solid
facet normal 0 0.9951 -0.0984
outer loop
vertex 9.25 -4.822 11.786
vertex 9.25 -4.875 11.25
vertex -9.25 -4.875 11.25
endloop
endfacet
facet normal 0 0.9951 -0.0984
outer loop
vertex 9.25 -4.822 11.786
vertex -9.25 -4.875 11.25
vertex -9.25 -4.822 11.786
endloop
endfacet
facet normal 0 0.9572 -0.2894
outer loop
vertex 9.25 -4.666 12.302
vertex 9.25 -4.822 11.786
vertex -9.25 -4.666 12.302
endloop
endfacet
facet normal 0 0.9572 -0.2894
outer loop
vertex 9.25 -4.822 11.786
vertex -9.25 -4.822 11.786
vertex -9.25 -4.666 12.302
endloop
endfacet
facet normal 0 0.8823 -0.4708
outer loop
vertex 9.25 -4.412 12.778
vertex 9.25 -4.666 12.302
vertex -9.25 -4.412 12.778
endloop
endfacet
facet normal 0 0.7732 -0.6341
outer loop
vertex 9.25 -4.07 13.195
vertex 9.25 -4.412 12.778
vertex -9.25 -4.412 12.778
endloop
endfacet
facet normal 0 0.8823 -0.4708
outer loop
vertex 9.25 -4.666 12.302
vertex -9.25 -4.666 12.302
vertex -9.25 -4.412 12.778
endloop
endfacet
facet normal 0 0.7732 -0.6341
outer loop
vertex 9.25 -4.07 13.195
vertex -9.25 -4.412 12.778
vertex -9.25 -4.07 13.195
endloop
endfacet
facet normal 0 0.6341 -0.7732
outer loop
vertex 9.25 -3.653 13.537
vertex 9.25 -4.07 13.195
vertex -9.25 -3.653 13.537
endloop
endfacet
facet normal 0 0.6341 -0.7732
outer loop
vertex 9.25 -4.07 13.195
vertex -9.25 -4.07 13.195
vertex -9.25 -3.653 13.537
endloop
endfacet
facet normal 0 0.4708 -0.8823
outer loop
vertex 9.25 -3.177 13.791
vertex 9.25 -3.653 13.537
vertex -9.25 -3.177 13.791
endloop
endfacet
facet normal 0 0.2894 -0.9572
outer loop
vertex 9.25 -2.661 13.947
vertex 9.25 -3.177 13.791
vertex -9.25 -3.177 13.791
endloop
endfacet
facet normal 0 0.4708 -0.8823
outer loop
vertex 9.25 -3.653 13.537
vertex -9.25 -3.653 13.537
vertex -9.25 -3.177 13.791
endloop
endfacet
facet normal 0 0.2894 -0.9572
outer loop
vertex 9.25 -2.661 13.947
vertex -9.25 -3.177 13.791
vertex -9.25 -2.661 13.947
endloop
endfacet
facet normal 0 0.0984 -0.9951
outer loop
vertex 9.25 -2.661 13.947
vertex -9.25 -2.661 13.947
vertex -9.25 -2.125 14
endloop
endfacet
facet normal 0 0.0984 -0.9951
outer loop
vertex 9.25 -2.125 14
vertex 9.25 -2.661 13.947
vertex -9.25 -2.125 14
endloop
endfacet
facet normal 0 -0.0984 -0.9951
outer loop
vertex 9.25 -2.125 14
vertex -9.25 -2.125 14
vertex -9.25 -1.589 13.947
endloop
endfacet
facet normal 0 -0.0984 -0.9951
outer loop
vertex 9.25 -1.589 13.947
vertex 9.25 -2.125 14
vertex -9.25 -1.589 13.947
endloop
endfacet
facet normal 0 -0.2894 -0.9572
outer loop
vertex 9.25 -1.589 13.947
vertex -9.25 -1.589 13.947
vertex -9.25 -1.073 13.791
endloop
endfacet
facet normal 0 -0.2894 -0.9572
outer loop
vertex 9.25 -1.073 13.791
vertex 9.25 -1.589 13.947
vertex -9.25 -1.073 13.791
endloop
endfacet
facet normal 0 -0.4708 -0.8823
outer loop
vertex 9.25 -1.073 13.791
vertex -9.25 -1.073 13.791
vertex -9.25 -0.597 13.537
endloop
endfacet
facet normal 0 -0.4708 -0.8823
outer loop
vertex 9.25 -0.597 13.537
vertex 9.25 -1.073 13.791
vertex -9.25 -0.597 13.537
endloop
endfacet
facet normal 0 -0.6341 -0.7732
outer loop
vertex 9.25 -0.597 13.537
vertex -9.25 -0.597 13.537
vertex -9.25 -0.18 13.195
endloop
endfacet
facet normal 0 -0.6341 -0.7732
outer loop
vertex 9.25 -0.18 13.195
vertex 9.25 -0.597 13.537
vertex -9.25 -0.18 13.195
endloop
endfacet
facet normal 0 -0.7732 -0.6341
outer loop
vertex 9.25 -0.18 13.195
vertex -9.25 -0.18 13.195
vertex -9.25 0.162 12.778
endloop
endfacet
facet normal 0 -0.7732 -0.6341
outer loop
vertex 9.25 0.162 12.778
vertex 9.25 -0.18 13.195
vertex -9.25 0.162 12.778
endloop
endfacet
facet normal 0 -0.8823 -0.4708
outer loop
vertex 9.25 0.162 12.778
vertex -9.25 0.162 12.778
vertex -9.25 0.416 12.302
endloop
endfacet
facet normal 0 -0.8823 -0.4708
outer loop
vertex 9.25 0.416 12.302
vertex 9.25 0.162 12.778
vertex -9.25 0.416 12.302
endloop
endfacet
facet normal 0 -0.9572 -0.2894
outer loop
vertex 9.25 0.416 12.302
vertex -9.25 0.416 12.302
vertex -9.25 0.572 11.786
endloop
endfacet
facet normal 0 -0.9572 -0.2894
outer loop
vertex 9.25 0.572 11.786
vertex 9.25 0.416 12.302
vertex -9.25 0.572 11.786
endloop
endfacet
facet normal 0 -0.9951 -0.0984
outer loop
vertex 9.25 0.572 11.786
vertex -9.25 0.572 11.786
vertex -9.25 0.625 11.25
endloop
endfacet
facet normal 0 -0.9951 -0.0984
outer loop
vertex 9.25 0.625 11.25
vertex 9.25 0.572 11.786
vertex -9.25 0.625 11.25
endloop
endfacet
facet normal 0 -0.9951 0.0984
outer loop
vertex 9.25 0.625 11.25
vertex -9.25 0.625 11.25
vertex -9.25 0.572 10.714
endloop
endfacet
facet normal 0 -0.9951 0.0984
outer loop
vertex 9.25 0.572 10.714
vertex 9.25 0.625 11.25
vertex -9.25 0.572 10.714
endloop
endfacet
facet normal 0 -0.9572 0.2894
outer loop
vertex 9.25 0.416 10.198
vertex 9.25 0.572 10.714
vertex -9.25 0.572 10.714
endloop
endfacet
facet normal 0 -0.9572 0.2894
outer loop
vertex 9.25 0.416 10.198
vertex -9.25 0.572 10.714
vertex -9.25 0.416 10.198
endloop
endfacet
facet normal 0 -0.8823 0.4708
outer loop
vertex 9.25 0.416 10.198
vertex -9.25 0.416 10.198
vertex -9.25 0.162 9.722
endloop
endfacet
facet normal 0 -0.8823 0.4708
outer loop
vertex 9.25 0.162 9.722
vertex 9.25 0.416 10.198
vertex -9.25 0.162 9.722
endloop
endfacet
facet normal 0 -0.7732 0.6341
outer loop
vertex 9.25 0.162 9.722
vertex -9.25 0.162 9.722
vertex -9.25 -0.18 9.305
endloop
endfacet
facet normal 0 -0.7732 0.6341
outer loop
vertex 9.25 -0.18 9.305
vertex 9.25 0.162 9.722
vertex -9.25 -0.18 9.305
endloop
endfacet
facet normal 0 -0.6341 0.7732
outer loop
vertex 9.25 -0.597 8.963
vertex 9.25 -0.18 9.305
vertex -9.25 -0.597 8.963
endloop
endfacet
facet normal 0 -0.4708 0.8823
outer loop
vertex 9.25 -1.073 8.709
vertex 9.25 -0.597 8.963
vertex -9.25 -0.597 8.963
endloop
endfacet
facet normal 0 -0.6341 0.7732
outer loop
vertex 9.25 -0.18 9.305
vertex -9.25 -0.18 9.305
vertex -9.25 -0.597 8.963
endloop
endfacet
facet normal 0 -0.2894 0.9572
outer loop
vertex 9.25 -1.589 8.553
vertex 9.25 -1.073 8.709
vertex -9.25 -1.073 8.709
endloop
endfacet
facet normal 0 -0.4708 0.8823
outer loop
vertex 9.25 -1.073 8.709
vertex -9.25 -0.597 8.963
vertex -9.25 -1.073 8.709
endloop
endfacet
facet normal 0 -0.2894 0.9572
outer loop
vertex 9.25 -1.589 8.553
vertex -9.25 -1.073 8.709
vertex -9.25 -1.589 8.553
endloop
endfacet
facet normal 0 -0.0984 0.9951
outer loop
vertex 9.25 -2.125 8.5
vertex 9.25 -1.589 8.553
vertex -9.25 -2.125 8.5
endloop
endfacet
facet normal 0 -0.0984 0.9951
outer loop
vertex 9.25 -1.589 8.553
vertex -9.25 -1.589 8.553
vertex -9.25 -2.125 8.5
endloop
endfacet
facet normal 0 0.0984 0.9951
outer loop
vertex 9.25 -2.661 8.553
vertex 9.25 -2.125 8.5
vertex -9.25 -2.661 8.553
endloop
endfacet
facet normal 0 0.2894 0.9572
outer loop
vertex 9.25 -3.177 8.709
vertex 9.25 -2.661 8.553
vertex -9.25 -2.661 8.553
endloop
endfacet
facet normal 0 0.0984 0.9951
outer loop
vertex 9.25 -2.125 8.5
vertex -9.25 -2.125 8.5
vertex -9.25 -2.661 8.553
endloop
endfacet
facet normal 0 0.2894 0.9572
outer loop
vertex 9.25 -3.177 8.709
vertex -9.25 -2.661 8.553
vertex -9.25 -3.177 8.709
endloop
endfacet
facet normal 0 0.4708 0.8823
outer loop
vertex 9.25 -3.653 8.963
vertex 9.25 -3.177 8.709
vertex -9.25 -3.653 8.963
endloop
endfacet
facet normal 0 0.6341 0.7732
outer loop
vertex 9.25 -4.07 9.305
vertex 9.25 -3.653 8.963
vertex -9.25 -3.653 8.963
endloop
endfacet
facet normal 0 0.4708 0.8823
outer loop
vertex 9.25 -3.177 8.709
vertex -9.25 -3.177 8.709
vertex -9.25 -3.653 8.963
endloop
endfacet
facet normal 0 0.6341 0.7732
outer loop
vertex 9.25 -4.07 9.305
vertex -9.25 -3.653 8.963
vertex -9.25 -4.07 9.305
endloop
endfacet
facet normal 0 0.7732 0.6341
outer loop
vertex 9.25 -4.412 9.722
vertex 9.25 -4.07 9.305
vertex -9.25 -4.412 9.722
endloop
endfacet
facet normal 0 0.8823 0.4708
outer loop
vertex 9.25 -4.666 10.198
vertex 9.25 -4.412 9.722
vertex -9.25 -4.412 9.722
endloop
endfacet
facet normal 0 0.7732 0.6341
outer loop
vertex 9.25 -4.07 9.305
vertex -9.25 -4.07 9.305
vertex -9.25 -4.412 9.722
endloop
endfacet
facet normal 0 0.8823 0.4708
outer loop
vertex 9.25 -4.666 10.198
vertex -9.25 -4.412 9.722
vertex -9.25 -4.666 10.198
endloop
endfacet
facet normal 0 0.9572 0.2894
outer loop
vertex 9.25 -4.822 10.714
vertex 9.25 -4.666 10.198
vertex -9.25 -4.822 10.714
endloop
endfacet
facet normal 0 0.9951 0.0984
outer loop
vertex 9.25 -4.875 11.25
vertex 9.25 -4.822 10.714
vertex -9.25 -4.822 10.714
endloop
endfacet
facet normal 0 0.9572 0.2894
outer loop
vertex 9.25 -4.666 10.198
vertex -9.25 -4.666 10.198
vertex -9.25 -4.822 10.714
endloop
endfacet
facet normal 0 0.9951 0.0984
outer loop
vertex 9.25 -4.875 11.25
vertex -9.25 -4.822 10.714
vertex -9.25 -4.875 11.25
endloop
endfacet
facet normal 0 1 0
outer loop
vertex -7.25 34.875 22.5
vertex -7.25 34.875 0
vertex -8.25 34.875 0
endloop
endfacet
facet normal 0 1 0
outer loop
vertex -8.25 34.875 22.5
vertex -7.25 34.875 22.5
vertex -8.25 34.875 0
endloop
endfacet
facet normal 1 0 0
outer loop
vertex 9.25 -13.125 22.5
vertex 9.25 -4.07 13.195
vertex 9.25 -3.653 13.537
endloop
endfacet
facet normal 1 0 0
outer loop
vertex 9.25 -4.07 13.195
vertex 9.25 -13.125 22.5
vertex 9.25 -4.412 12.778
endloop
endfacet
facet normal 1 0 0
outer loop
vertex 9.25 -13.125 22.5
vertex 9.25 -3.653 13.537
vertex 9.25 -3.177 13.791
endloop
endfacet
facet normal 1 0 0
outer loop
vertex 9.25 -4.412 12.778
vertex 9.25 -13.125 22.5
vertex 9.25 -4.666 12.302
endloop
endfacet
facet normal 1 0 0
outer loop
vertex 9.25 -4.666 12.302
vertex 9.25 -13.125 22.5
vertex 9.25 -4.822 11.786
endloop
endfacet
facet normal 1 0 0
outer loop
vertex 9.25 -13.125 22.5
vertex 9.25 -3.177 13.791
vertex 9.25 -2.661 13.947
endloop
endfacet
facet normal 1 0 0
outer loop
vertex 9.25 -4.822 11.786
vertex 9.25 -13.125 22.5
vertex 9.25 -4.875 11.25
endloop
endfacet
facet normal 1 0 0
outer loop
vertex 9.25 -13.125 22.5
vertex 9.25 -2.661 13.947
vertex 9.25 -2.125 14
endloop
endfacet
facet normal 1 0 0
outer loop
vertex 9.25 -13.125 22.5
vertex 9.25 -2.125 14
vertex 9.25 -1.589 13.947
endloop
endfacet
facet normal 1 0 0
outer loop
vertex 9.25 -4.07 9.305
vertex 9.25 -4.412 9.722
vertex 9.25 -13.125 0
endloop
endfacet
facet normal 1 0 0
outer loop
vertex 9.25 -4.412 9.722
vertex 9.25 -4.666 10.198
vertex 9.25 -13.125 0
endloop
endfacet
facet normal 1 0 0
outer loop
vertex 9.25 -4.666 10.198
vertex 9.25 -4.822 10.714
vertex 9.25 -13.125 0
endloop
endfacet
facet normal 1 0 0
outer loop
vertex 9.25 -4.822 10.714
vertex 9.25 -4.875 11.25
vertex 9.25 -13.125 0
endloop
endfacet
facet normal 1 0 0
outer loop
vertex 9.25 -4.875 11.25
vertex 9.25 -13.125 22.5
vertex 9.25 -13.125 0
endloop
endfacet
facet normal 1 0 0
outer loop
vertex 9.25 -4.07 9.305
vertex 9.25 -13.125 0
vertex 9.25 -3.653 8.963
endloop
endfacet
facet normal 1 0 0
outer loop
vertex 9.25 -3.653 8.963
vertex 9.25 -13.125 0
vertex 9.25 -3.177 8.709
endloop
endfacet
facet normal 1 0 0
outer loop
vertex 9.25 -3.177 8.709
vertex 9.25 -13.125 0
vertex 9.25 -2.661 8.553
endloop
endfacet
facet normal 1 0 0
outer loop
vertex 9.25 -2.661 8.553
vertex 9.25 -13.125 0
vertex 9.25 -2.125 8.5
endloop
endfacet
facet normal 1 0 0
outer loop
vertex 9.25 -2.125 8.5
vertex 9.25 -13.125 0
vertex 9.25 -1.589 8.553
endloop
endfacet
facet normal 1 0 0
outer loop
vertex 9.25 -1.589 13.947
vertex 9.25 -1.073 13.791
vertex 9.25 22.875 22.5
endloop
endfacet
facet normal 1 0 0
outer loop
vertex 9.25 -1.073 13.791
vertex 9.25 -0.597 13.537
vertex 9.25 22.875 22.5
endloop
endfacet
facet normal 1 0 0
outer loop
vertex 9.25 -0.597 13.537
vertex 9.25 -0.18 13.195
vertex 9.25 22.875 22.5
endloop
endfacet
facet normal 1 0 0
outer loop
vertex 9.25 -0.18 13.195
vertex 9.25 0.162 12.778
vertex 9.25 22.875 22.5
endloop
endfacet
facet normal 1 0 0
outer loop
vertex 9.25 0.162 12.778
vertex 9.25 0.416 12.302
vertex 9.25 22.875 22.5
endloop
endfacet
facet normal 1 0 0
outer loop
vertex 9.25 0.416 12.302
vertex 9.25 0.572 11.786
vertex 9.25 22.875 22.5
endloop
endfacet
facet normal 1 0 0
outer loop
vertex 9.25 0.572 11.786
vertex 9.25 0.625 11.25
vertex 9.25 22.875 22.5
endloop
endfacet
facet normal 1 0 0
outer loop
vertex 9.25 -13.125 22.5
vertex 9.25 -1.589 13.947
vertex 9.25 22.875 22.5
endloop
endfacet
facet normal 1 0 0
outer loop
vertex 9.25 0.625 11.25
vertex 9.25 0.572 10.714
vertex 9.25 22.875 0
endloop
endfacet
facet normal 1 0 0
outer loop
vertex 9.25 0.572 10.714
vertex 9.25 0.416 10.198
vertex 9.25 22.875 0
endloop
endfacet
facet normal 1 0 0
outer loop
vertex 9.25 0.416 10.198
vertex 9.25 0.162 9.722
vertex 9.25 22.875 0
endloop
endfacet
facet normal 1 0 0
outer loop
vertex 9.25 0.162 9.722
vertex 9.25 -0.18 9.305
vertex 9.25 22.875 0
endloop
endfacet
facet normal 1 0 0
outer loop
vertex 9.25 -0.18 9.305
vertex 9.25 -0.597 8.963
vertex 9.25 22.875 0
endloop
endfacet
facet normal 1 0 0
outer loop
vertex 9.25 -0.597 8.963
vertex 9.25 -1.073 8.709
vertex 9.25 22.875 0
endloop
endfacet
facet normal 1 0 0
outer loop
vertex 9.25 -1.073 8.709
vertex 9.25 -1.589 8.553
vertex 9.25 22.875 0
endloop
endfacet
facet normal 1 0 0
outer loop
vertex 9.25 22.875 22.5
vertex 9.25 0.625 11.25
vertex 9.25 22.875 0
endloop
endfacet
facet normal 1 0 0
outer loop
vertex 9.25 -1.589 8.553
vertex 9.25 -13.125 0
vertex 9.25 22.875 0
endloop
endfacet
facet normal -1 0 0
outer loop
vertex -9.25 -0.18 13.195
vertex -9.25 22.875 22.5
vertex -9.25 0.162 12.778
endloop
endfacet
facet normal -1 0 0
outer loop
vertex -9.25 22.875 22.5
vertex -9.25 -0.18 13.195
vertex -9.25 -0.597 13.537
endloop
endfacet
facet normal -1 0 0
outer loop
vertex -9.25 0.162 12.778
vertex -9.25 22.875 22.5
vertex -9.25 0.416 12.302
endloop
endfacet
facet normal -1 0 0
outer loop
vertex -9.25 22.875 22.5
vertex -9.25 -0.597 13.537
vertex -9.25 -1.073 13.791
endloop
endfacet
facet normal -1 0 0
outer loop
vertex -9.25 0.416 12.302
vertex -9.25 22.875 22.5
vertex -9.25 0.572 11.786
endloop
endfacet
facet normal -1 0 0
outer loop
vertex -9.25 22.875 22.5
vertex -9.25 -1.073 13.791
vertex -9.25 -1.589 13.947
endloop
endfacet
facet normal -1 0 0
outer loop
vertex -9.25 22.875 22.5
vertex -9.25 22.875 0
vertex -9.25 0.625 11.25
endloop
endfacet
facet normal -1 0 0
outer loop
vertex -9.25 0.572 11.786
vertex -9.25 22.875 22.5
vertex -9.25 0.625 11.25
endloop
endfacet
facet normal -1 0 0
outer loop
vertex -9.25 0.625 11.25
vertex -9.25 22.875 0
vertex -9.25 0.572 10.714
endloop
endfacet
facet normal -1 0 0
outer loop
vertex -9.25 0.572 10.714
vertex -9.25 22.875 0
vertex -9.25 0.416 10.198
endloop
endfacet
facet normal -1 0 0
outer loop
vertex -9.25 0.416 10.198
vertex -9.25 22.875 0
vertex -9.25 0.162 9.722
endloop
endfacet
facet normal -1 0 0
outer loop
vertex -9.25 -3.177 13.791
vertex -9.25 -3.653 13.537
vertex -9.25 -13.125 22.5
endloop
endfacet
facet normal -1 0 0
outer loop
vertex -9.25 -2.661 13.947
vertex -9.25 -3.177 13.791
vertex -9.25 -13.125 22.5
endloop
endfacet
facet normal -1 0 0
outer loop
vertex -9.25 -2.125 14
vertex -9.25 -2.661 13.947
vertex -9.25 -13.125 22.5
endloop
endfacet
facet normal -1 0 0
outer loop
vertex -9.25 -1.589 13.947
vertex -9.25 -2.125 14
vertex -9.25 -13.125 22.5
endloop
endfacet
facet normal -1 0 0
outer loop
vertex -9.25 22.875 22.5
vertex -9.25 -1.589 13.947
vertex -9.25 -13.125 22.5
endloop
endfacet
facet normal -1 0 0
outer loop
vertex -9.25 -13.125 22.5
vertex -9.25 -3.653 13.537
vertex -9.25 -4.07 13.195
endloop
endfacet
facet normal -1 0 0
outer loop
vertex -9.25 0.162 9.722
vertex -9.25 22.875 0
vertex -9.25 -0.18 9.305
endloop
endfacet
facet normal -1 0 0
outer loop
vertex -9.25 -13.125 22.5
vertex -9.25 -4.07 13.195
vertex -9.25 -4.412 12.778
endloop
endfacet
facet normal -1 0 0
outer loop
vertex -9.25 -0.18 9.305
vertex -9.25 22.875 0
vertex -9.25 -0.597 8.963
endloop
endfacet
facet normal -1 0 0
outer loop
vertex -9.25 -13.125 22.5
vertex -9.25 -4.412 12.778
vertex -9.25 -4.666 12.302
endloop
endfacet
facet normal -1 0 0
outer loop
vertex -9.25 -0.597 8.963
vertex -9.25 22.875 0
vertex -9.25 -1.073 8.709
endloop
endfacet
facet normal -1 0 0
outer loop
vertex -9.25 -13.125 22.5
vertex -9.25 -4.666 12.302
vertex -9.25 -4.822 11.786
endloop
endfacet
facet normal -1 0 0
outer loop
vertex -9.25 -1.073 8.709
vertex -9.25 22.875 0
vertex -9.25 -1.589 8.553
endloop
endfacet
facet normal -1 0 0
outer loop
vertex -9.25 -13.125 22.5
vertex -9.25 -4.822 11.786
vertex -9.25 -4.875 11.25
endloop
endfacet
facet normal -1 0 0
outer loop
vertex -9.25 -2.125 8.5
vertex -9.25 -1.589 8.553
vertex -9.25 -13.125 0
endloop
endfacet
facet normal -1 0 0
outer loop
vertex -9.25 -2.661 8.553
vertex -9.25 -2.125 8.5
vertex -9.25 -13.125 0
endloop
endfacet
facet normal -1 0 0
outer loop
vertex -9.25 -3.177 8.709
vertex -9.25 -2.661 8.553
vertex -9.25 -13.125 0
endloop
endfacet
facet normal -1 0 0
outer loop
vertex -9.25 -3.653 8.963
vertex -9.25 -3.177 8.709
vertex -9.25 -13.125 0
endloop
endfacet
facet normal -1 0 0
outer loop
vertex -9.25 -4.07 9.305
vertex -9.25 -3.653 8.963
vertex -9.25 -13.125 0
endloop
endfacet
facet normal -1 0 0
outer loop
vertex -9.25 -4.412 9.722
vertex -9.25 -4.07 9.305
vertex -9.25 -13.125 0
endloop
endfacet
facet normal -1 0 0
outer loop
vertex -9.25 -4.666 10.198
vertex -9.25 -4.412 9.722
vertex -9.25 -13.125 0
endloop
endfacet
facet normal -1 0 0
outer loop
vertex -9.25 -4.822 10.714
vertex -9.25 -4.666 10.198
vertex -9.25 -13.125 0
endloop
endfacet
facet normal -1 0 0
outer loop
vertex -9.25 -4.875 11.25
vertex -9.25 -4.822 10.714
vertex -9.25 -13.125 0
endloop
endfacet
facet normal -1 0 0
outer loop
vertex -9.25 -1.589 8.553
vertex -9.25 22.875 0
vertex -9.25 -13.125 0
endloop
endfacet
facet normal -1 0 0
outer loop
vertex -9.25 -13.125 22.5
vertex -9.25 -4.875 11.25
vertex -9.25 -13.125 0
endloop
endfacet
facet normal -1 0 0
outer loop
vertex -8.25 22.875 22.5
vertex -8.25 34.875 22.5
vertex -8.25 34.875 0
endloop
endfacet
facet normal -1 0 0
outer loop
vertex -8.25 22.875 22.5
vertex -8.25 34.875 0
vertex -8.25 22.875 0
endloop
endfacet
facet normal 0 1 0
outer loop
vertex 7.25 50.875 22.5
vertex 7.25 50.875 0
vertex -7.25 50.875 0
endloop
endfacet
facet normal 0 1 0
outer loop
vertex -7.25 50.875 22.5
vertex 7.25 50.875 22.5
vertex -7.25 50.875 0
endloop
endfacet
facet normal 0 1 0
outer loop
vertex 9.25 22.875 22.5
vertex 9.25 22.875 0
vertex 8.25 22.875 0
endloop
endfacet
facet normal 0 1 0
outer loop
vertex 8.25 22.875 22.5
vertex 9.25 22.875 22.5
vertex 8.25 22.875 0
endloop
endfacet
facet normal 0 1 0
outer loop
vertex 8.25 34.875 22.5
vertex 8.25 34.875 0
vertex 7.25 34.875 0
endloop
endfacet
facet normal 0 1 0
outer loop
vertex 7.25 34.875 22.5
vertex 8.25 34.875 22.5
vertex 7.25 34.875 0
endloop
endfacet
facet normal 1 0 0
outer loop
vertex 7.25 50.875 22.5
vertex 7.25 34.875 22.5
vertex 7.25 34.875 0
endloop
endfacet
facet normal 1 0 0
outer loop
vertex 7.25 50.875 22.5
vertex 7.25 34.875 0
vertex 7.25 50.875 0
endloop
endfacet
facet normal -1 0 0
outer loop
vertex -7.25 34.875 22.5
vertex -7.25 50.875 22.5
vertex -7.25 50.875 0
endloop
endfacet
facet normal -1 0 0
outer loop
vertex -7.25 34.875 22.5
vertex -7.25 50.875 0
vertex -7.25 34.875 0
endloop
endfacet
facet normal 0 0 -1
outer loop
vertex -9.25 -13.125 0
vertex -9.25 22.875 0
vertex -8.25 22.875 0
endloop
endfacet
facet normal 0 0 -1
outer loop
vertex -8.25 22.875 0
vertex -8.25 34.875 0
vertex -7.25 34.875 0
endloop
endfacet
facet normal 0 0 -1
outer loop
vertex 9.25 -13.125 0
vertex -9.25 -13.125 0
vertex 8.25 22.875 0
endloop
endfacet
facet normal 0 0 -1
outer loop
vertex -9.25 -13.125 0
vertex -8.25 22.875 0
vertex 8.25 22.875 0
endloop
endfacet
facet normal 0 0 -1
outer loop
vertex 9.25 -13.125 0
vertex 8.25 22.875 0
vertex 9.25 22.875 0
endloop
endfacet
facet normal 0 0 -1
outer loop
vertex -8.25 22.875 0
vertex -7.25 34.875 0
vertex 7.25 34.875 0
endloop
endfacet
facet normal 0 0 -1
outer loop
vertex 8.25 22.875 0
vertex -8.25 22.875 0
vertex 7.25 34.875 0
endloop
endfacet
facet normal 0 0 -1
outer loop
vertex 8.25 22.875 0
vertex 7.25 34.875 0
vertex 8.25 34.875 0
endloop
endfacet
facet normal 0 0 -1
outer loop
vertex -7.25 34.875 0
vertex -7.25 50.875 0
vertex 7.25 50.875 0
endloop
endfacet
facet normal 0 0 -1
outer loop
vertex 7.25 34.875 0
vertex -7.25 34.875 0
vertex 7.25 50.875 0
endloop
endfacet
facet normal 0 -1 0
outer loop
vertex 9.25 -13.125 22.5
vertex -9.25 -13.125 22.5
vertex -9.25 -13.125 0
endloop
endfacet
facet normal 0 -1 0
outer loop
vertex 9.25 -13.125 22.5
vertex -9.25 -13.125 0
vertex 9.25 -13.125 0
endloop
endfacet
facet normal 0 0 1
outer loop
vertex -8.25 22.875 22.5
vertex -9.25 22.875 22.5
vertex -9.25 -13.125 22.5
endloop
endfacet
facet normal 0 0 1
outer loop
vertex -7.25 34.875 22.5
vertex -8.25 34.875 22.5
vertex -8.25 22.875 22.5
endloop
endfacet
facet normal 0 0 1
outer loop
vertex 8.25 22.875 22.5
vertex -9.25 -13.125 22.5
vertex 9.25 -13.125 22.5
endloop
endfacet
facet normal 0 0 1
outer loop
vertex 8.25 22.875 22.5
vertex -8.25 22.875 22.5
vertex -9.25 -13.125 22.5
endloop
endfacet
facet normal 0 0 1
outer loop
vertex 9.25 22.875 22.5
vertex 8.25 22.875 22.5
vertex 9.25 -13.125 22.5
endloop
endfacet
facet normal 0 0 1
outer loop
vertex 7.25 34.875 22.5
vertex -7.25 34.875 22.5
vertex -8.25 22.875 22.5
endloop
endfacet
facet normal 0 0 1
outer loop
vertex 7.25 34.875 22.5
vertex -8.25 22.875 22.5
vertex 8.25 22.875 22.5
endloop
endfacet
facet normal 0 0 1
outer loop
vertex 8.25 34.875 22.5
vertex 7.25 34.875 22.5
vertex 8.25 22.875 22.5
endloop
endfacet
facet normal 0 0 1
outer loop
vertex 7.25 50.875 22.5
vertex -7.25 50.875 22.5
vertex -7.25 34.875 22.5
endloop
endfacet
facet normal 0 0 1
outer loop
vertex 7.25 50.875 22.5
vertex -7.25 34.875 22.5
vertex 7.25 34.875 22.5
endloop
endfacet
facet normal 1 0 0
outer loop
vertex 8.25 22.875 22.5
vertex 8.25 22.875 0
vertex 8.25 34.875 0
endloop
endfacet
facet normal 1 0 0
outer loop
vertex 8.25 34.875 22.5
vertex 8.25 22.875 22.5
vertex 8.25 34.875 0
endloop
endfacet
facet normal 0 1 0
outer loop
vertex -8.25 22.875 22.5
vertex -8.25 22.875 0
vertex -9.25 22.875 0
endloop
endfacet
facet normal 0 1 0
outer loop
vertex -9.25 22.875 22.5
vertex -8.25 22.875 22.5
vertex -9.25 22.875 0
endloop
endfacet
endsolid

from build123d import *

# Parameters (mm, degrees)
F1_DEPTH = 22.5
F3_R     = 2.75
F4_DEPTH = 22.5


with BuildPart() as f1:
    # F0 (on Top) → F1 (new body)
    with BuildSketch(Plane.XY):
        Polygon((0, 50.875000723), (0, -13.124999277), (9.25, -13.124999277), (9.25, 22.875000723), (8.2500004293, 22.875000723), (8.2500004293, 34.875000723), (7.2500008586, 34.875000723), (7.2500008586, 50.875000723), align=None)
        Polygon((-9.25, -13.124999277), (0, -13.124999277), (0, 50.875000723), (-7.2500008586, 50.875000723), (-7.2500008586, 34.875000723), (-8.2500004293, 34.875000723), (-8.2500004293, 22.875000723), (-9.25, 22.875000723), align=None)
    extrude(amount=F1_DEPTH)

    # F3 (on offset) → F4 (cut)
    with BuildSketch(Plane(origin=(-9.25, 0, 0), x_dir=(0, -1, 0), z_dir=(-1, 0, 0))):
        with Locations((2.124999277, 11.25)):
            Circle(F3_R)
    extrude(amount=-F4_DEPTH, mode=Mode.SUBTRACT)


solid = f1.part
